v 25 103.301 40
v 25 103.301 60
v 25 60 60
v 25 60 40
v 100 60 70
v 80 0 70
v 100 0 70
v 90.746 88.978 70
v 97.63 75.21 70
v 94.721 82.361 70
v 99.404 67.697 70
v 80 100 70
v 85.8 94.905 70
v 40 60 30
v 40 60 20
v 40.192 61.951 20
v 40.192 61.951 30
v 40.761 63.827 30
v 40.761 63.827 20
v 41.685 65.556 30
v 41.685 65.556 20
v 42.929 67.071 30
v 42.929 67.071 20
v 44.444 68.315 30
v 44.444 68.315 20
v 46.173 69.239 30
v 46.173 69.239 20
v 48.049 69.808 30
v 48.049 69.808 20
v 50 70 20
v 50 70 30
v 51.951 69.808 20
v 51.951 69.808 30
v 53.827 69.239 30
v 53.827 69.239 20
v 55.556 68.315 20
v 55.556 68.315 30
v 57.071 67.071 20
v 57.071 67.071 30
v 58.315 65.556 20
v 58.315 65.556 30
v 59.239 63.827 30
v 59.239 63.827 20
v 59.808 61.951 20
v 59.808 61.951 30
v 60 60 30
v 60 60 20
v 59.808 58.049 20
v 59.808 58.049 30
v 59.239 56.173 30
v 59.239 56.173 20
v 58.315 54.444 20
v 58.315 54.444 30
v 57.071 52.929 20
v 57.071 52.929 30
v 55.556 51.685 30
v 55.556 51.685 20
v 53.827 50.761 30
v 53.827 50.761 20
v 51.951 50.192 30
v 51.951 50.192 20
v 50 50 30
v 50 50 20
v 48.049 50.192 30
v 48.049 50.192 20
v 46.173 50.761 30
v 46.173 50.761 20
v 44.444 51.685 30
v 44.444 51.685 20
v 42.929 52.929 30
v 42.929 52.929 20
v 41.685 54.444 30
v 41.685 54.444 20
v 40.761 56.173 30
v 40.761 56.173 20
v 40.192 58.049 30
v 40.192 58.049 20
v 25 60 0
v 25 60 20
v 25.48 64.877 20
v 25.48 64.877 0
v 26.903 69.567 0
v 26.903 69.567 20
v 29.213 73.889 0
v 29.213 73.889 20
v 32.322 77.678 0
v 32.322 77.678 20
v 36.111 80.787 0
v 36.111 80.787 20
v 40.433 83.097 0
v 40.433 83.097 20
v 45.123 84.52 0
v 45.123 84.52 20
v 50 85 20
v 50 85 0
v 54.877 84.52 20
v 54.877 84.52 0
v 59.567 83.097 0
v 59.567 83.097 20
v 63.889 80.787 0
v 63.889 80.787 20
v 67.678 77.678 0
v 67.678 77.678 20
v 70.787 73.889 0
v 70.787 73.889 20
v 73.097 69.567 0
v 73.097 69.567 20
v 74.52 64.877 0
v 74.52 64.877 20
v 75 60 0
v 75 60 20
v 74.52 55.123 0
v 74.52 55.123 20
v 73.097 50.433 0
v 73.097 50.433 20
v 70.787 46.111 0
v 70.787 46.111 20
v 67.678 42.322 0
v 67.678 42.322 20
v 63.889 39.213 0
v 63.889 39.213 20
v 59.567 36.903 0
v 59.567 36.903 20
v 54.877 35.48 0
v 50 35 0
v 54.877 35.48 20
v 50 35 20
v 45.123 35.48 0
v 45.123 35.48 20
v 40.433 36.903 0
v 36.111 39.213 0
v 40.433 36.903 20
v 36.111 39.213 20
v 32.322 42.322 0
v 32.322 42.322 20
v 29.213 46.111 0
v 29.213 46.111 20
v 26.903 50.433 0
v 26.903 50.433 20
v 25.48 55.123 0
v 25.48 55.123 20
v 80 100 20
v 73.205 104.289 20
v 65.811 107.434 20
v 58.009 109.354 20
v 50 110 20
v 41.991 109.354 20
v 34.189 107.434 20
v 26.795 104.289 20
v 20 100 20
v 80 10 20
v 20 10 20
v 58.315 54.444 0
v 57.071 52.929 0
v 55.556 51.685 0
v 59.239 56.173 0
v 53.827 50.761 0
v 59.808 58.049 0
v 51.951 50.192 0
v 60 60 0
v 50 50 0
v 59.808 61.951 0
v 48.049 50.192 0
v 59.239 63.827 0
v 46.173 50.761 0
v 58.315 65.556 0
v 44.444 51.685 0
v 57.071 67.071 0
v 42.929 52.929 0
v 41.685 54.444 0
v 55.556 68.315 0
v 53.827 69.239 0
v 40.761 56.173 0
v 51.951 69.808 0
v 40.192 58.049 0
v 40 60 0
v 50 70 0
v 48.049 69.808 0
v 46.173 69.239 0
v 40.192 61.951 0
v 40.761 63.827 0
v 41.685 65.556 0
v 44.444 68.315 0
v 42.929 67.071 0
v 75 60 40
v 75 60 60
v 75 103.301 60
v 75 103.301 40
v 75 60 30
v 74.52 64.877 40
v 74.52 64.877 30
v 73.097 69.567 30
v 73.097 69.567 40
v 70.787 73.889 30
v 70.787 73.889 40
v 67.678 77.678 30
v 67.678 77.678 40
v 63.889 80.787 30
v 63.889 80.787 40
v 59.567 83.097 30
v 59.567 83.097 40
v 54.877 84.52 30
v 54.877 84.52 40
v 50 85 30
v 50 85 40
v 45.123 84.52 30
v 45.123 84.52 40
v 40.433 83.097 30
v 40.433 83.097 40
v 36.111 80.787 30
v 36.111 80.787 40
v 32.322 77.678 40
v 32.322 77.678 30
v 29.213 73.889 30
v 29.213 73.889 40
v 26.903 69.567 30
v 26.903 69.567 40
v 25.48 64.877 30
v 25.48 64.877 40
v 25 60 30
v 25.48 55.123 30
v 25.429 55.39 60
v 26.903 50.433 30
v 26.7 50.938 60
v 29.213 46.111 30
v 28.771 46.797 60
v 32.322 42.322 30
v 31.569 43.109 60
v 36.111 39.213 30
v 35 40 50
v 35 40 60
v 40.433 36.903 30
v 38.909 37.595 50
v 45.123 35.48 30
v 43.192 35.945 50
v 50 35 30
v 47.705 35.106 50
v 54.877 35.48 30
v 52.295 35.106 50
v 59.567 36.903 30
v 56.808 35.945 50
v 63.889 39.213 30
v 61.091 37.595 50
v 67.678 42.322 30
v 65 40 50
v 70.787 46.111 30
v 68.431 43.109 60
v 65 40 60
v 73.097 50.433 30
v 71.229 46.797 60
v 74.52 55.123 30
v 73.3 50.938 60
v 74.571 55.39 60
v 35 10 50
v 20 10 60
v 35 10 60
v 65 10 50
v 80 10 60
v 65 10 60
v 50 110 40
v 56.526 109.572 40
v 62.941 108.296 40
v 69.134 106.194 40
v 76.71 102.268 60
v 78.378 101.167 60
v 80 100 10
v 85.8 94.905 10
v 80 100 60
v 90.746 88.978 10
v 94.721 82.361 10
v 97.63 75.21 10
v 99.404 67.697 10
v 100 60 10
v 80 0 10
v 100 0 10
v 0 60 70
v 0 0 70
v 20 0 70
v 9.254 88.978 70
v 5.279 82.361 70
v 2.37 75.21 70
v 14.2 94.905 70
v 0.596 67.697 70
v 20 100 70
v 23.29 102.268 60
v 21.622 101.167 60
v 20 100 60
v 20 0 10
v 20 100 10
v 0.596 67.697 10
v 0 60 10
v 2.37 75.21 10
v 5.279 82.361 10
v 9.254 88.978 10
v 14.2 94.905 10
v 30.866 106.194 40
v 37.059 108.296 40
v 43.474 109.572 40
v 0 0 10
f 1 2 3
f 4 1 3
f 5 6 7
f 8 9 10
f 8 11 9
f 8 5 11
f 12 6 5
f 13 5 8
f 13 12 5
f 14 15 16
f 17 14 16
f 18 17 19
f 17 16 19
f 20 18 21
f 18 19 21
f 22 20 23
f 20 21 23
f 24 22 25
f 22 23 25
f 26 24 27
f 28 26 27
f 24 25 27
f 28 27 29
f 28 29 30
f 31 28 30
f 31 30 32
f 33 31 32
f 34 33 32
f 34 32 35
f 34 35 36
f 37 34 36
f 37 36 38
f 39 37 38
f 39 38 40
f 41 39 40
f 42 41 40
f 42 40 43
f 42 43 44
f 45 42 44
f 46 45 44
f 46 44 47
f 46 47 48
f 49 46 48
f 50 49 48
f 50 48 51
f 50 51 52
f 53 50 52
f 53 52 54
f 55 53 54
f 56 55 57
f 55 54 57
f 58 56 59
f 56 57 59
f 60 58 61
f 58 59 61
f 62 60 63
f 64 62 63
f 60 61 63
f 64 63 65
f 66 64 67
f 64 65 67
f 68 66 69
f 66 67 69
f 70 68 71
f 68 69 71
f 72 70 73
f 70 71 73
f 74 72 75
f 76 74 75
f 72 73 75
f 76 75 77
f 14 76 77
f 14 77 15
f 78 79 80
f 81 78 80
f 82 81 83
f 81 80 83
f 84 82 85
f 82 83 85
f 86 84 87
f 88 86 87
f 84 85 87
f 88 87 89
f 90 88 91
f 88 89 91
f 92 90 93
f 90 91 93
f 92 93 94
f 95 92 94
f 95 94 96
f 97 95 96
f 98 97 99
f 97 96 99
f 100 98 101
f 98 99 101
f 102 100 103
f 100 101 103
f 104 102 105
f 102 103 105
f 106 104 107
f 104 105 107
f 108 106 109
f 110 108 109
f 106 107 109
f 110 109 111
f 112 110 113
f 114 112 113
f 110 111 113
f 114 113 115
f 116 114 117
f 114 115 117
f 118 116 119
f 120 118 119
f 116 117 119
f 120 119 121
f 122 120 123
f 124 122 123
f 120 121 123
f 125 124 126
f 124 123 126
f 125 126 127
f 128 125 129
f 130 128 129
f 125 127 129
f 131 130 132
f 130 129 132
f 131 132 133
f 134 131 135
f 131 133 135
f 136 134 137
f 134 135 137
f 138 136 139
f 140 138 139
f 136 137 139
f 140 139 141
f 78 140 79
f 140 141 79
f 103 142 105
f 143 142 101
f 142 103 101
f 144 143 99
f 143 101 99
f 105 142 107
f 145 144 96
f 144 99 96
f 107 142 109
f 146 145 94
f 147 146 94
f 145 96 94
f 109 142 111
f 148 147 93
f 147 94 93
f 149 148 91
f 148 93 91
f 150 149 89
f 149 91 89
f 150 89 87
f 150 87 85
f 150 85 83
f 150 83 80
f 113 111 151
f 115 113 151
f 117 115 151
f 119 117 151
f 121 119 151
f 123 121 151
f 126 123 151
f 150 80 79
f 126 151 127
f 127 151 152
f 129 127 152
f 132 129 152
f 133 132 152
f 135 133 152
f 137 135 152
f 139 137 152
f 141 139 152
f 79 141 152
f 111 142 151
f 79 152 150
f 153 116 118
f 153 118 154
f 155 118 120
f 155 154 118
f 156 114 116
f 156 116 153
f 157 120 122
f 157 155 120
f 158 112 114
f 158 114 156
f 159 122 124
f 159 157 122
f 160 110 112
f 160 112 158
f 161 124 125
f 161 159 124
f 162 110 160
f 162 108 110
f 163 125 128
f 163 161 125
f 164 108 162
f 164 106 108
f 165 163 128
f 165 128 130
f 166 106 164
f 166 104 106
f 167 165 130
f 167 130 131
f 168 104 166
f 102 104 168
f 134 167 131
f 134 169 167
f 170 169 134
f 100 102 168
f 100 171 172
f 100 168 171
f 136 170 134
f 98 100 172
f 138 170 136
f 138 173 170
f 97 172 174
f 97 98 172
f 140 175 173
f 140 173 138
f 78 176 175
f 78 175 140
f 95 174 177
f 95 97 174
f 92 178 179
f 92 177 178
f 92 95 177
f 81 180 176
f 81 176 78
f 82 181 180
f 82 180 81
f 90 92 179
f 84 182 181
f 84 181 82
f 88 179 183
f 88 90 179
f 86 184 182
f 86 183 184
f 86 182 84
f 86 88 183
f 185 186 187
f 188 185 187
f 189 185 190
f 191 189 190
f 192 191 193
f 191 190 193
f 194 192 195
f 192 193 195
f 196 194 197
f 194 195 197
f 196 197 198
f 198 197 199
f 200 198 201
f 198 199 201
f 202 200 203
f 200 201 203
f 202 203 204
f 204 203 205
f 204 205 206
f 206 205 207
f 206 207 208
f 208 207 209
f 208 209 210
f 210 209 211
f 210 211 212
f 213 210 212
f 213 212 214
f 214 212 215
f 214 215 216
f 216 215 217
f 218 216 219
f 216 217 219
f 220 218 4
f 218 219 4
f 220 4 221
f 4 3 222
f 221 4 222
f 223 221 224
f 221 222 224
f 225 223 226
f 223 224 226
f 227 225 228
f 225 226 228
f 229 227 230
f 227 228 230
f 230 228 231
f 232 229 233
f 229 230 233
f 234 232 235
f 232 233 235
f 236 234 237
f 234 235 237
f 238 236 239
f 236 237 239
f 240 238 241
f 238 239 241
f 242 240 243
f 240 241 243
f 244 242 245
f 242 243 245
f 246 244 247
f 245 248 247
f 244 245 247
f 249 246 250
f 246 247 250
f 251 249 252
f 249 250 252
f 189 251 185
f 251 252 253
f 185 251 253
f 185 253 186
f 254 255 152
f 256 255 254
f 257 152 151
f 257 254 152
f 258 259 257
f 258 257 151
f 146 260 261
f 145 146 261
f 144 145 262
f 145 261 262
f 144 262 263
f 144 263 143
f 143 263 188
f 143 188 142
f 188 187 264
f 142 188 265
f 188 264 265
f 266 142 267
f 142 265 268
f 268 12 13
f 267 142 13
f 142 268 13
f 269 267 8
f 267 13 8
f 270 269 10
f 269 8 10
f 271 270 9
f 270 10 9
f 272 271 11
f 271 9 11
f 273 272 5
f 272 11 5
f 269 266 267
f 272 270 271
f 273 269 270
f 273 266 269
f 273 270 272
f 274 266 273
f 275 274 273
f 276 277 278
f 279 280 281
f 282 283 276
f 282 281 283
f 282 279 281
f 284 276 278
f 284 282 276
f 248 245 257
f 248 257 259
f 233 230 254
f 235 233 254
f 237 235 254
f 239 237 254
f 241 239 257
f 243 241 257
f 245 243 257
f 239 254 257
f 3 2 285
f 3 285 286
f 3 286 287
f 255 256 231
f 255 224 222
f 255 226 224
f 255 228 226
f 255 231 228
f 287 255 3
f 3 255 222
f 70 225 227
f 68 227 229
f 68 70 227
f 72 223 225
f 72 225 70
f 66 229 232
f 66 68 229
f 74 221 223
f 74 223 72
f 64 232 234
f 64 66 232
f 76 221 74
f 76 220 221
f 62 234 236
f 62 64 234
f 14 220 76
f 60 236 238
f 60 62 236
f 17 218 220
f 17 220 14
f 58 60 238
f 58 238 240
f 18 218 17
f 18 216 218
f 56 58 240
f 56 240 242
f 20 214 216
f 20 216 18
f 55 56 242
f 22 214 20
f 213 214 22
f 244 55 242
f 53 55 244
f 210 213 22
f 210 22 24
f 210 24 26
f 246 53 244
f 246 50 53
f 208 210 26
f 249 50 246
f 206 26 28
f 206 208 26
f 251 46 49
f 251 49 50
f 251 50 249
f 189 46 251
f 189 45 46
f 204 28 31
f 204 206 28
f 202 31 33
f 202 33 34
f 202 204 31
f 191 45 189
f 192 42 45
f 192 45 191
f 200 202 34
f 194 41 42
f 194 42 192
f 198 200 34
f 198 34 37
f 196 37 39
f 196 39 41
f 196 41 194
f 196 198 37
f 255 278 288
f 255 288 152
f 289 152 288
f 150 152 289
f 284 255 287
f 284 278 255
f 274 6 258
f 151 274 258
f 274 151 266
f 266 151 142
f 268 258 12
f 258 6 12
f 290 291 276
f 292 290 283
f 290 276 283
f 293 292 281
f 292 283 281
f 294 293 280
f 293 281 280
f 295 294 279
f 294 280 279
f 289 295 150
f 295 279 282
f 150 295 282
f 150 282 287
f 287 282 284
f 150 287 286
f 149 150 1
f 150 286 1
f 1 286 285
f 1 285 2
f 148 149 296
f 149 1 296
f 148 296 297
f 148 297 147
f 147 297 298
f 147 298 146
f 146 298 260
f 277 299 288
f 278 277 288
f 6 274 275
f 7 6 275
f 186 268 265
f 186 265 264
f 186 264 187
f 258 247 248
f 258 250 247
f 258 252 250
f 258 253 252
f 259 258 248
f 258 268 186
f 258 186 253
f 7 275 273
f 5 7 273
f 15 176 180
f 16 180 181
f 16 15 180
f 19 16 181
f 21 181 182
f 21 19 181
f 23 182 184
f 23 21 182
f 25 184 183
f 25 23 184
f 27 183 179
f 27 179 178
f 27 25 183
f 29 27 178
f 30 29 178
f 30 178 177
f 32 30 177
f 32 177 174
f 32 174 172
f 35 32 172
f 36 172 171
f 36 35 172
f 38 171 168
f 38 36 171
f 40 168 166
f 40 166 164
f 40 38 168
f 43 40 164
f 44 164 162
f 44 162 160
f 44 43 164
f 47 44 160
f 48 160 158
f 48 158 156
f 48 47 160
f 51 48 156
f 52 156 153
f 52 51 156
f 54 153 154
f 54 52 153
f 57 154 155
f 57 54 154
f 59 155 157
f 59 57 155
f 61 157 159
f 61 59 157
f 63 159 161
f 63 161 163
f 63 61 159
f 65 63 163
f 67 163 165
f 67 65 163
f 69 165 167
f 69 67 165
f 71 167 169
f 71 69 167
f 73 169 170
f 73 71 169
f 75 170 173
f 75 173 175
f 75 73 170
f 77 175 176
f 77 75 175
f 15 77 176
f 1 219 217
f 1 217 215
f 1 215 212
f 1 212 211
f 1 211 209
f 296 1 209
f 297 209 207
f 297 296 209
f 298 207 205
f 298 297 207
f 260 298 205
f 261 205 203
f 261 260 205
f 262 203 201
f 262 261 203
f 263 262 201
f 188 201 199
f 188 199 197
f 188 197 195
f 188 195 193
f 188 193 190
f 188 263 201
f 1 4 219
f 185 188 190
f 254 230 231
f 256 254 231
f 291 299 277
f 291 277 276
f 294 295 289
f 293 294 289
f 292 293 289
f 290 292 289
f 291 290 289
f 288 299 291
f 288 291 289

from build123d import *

# Parameters (mm, degrees)
SKETCH1_W           = 100
SKETCH1_H           = 110
BOSS_EXTRUDE1_DEPTH = 70
SKETCH2_W           = 60
SKETCH2_H           = 10
CUT_EXTRUDE1_DEPTH  = 70
CUT_EXTRUDE2_DEPTH  = 70
SKETCH4_R           = 10
CUT_EXTRUDE3_DEPTH  = 30
SKETCH5_W           = 100
SKETCH5_H           = 10
CUT_EXTRUDE4_DEPTH  = 185
SKETCH7_W           = 60
SKETCH7_H           = 10
CUT_EXTRUDE5_DEPTH  = 200
SKETCH8_R           = 25
SKETCH8_R_2         = 10
BOSS_EXTRUDE3_DEPTH = 20
SKETCH9_R           = 25
CUT_EXTRUDE7_DEPTH  = 40
CUT_EXTRUDE8_DEPTH  = 30
SKETCH11_W          = 60
SKETCH11_H          = 10
CUT_EXTRUDE9_DEPTH  = 130
SKETCH12_W          = 30
SKETCH12_H          = 10
CUT_EXTRUDE10_DEPTH = 130


with BuildPart() as part:
    # Sketch1 → Boss-Extrude1 (new body)
    with BuildSketch(Plane.XY):
        with Locations((50, 55)):
            Rectangle(SKETCH1_W, SKETCH1_H)
    extrude(amount=BOSS_EXTRUDE1_DEPTH)

    # Sketch2 → Cut-Extrude1 (cut)
    with BuildSketch(Plane.XY.offset(70)):
        with Locations((50, 5)):
            Rectangle(SKETCH2_W, SKETCH2_H)
    extrude(amount=-CUT_EXTRUDE1_DEPTH, mode=Mode.SUBTRACT)

    # Sketch3 → Cut-Extrude2 (cut)
    with BuildSketch(Plane.XY.offset(70)):
        with BuildLine():
            Line((0, 110), (0, 60))
            ThreePointArc((0, 60), (14.644660941, 95.355339059), (50, 110))
            Line((50, 110), (0, 110))
        make_face()
        with BuildLine():
            Line((100, 110), (50, 110))
            ThreePointArc((50, 110), (85.355339059, 95.355339059), (100, 60))
            Line((100, 60), (100, 110))
        make_face()
    extrude(amount=-CUT_EXTRUDE2_DEPTH, mode=Mode.SUBTRACT)

    # Sketch4 → Cut-Extrude3 (cut)
    with BuildSketch(Plane(origin=(0, 0, 0), x_dir=(-1, 0, 0), z_dir=(0, 0, -1))):
        with Locations((-50, 60)):
            Circle(SKETCH4_R)
    extrude(amount=-CUT_EXTRUDE3_DEPTH, mode=Mode.SUBTRACT)

    # Sketch5 → Cut-Extrude4 (cut)
    with BuildSketch(Plane.XZ):
        with Locations((50, 5)):
            Rectangle(SKETCH5_W, SKETCH5_H)
    extrude(amount=-CUT_EXTRUDE4_DEPTH, mode=Mode.SUBTRACT)

    # Sketch7 → Cut-Extrude5 (cut)
    with BuildSketch(Plane(origin=(0, 10, 0), x_dir=(-1, 0, 0), z_dir=(0, -1, 0))):
        with Locations((-50, -15)):
            Rectangle(SKETCH7_W, SKETCH7_H)
    extrude(amount=-CUT_EXTRUDE5_DEPTH, mode=Mode.SUBTRACT)

    # Sketch8 → Boss-Extrude3 (add)
    with BuildSketch(Plane(origin=(0, 0, 20), x_dir=(-1, 0, 0), z_dir=(0, 0, -1))):
        with Locations((-50, 60)):
            Circle(SKETCH8_R)
        with Locations((-50, 60)):
            Circle(SKETCH8_R_2, mode=Mode.SUBTRACT)
    extrude(amount=BOSS_EXTRUDE3_DEPTH)

    # Sketch9 → Cut-Extrude7 (cut)
    with BuildSketch(Plane.XY.offset(70)):
        with Locations((50, 60)):
            Circle(SKETCH9_R)
    extrude(amount=-CUT_EXTRUDE7_DEPTH, mode=Mode.SUBTRACT)

    # Sketch10 → Cut-Extrude8 (cut)
    with BuildSketch(Plane.XY.offset(70)):
        with BuildLine():
            Line((25, 103.301270189), (25, 60))
            ThreePointArc((25, 60), (50, 85), (75, 60))
            Line((75, 60), (75, 103.301270189))
            ThreePointArc((75, 103.301270189), (50, 110), (25, 103.301270189))
        make_face()
    extrude(amount=-CUT_EXTRUDE8_DEPTH, mode=Mode.SUBTRACT)

    # Sketch11 → Cut-Extrude9 (cut)
    with BuildSketch(Plane(origin=(0, 10, 0), x_dir=(-1, 0, 0), z_dir=(0, -1, 0))):
        with Locations((-50, -65)):
            Rectangle(SKETCH11_W, SKETCH11_H)
    extrude(amount=-CUT_EXTRUDE9_DEPTH, mode=Mode.SUBTRACT)

    # Sketch12 → Cut-Extrude10 (cut)
    with BuildSketch(Plane.XZ.offset(-10)):
        with Locations((50, 55)):
            Rectangle(SKETCH12_W, SKETCH12_H)
    extrude(amount=-CUT_EXTRUDE10_DEPTH, mode=Mode.SUBTRACT)


solid = part.part
